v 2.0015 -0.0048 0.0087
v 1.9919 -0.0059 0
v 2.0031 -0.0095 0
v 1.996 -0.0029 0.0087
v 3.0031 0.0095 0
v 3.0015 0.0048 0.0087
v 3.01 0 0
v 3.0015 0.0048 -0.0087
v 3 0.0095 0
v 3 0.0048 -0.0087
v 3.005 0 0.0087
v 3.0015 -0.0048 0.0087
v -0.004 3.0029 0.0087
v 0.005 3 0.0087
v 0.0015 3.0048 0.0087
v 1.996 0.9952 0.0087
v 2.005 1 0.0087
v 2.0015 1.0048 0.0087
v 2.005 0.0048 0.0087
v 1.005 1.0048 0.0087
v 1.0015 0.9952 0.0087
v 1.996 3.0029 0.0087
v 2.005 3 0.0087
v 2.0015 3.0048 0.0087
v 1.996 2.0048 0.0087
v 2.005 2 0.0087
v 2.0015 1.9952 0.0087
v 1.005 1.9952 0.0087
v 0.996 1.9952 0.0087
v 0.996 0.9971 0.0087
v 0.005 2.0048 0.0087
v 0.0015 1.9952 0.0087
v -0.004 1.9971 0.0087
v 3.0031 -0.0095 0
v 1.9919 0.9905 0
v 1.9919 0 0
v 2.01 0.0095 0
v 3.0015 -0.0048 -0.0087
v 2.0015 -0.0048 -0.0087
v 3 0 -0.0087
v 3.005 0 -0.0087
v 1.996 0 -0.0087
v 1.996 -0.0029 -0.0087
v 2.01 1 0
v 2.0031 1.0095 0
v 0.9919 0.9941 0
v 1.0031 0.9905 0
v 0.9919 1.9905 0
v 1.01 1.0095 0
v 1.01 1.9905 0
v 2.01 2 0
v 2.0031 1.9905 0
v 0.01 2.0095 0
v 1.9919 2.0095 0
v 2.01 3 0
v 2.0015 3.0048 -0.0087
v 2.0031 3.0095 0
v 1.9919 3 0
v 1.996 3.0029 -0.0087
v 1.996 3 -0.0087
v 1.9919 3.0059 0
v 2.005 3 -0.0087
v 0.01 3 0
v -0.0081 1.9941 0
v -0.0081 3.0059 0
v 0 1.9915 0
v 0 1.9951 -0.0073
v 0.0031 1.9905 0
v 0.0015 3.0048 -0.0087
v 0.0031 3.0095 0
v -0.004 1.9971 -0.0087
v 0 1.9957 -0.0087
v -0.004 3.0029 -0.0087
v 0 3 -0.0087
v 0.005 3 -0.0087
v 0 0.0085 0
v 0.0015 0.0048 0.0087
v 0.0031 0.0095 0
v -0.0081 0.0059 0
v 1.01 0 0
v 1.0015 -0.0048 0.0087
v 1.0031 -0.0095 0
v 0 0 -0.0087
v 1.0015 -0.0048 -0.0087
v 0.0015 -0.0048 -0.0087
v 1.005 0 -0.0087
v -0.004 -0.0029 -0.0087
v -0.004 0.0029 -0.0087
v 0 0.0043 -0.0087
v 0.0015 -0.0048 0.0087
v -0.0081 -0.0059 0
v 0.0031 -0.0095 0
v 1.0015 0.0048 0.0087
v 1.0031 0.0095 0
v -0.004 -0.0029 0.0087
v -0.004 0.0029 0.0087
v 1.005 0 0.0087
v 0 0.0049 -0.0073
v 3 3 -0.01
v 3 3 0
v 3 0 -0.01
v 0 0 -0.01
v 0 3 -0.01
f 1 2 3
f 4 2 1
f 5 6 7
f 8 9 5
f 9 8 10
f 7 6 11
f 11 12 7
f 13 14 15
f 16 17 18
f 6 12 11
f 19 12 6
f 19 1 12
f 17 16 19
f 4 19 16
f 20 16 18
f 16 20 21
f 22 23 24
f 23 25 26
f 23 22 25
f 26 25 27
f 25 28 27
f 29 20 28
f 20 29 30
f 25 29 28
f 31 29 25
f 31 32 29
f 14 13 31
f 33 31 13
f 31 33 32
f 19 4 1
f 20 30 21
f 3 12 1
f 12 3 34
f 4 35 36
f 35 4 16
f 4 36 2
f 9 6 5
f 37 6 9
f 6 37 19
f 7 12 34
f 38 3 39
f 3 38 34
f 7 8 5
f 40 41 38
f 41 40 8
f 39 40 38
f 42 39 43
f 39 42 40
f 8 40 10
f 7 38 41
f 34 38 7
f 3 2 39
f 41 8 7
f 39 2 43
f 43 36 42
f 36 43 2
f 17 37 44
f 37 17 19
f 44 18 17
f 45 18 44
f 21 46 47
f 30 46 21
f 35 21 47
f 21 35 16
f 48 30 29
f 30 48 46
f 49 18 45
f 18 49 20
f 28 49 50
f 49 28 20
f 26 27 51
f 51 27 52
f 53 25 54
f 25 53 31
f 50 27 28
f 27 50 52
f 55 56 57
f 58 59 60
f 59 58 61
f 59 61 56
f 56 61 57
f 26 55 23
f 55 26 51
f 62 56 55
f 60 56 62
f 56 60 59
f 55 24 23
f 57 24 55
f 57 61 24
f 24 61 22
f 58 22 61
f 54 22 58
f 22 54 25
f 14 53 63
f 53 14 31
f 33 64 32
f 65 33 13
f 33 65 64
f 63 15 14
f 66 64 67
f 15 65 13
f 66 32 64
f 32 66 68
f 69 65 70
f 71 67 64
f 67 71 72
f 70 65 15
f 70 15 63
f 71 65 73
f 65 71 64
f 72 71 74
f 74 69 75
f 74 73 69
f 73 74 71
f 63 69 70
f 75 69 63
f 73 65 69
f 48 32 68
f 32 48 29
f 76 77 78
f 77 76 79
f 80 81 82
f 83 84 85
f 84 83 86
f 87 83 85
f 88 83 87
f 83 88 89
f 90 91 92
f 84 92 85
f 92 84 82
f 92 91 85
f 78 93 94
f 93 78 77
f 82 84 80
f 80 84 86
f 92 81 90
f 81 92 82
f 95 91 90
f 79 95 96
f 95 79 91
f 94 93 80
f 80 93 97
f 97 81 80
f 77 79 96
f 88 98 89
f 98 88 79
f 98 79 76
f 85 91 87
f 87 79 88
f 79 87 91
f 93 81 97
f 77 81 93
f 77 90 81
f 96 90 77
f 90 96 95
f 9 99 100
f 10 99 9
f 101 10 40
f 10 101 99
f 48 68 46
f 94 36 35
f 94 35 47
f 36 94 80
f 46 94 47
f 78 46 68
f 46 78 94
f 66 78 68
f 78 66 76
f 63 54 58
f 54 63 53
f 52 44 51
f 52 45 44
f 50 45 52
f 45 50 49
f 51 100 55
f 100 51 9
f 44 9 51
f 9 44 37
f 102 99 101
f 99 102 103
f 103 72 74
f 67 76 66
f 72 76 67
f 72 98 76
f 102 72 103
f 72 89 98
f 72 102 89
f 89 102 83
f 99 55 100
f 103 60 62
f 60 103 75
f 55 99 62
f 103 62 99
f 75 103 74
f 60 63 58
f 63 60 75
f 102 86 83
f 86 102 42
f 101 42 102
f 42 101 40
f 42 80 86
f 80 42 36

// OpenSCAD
hull(){
    translate([3.0, 0.0]) sphere(0.01);
    translate([2.0, 0.0]) sphere(0.01);
}
hull(){
    translate([2.0, 0.0]) sphere(0.01);
    translate([2.0, 1.0]) sphere(0.01);
}
hull(){
    translate([2.0, 1.0]) sphere(0.01);
    translate([1.0, 1.0]) sphere(0.01);
}
hull(){
    translate([1.0, 1.0]) sphere(0.01);
    translate([1.0, 2.0]) sphere(0.01);
}
hull(){
    translate([1.0, 2.0]) sphere(0.01);
    translate([2.0, 2.0]) sphere(0.01);
}
hull(){
    translate([2.0, 2.0]) sphere(0.01);
    translate([2.0, 3.0]) sphere(0.01);
}
hull(){
    translate([0.0, 3.0]) sphere(0.01);
    translate([0.0, 2.0]) sphere(0.01);
}
hull(){
    translate([0.0, 2.0]) sphere(0.01);
    translate([1.0, 2.0]) sphere(0.01);
}
hull(){
    translate([1.0, 0.0]) sphere(0.01);
    translate([0.0, 0.0]) sphere(0.01);
}
translate([0,0,-0.01]) color([0.1,0.1,0.1]) cube([3,3,0.01]);
